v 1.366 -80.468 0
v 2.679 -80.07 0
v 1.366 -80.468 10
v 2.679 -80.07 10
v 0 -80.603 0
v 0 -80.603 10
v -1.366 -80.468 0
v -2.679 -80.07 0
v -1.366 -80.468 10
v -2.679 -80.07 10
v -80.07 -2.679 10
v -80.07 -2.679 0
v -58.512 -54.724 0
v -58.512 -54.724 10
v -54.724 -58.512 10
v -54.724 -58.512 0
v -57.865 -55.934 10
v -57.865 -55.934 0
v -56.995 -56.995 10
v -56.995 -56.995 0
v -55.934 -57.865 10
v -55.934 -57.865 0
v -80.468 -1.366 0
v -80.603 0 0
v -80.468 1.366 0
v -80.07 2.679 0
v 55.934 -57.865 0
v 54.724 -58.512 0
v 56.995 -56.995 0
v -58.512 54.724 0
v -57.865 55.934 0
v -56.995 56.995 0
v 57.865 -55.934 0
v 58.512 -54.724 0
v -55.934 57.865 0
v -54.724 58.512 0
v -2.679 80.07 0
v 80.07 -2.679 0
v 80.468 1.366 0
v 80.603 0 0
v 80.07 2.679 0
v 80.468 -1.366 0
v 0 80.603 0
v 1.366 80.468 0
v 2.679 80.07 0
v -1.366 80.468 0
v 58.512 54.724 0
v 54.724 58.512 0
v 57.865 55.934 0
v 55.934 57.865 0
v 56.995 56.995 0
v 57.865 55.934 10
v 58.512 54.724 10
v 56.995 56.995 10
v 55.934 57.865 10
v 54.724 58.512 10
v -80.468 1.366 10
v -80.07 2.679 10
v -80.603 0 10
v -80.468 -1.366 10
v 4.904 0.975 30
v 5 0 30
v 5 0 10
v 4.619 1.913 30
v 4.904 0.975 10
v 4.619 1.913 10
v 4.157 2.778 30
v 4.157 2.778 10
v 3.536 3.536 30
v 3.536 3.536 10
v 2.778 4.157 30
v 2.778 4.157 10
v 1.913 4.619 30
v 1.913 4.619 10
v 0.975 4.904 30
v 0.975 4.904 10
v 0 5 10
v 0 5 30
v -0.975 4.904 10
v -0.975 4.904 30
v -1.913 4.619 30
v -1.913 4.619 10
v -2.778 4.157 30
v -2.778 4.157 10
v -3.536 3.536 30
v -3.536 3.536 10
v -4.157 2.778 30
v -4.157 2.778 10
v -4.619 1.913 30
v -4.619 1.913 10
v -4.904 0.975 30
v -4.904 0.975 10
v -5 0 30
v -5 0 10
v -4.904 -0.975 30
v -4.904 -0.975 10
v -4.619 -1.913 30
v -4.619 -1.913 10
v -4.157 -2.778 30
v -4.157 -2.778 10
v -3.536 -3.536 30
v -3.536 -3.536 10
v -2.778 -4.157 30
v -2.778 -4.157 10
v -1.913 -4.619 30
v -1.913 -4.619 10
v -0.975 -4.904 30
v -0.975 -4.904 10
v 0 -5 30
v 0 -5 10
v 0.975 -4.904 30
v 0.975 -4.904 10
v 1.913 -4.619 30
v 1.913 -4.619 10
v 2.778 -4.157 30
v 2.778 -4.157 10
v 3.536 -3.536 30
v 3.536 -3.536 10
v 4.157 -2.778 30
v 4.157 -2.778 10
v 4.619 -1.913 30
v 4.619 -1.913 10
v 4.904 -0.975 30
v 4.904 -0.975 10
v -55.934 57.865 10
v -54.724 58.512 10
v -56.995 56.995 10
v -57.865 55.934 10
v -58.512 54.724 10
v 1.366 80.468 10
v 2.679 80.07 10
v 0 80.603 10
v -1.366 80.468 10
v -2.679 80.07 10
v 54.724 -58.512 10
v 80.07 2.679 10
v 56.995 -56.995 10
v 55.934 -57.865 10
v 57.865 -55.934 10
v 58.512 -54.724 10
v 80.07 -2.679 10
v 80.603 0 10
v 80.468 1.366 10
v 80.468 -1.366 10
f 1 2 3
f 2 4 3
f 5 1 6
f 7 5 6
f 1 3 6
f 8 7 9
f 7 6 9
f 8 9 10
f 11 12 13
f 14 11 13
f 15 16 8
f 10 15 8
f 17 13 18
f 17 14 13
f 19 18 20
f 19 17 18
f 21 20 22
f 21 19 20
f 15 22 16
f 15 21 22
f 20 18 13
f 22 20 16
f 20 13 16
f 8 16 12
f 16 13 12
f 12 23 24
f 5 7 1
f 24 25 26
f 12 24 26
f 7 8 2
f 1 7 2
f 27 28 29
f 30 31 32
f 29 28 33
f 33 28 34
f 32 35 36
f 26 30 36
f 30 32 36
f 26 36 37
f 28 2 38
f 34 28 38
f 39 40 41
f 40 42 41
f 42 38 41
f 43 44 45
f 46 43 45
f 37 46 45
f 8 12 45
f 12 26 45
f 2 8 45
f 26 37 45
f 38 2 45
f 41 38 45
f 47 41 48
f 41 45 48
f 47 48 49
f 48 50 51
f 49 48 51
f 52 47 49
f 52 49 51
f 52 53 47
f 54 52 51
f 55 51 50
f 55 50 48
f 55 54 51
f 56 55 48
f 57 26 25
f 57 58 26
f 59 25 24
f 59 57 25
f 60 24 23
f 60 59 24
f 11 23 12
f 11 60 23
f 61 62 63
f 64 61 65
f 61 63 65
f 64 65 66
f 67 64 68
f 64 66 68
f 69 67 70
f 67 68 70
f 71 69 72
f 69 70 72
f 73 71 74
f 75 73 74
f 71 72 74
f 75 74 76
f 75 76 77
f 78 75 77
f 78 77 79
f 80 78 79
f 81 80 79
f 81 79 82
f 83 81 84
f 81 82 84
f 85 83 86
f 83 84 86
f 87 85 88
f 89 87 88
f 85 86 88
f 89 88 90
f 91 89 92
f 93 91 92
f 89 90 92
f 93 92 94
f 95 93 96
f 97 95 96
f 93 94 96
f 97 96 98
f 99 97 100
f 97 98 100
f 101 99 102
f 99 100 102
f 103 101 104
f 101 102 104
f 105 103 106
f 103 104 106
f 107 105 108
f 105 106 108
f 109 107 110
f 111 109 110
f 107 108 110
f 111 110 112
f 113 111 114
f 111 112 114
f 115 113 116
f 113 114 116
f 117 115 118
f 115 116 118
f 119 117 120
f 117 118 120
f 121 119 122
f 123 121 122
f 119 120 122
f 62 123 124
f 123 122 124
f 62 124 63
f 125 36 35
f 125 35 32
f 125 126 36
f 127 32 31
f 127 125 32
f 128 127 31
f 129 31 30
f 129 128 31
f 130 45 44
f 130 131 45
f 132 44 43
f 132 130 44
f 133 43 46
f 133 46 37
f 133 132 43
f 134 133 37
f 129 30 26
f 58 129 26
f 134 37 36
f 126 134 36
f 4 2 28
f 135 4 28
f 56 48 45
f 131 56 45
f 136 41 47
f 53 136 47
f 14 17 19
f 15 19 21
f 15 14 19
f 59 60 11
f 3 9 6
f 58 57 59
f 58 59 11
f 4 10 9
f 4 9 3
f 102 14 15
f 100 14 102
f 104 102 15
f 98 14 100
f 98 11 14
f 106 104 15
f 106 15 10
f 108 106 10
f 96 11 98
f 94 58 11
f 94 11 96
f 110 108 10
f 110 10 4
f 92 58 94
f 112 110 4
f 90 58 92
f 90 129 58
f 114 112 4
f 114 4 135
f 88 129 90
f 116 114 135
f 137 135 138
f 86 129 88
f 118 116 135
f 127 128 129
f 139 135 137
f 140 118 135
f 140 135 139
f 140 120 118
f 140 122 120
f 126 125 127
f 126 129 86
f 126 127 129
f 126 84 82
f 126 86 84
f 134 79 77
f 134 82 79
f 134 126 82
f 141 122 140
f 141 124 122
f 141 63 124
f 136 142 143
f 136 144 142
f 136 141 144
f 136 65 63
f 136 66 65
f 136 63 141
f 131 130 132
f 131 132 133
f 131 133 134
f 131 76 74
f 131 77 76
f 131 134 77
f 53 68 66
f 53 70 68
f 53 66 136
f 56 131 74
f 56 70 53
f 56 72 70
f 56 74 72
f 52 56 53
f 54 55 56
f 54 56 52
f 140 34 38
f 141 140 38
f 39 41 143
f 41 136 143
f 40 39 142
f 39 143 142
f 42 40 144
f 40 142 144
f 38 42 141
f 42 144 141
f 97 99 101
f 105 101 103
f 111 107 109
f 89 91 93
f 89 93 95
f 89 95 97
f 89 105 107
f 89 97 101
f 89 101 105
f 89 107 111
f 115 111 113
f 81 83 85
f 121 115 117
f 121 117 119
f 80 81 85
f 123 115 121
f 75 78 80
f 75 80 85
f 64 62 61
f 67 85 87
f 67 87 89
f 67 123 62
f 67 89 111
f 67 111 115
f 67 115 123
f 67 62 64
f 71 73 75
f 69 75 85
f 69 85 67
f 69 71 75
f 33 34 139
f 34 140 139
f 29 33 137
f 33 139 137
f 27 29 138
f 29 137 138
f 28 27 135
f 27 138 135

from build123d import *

# Parameters (mm, degrees)
F1_DEPTH = 10
F2_R     = 5
F3_DEPTH = 20
F4_R     = 7


with BuildPart() as f1:
    # F0 (on Top) → F1 (new body)
    with BuildSketch(Plane.XY):
        Polygon((81.179415, 0), (57.402515, 57.402515), (0, 81.179415), (-57.402515, 57.402515), (-81.179415, 0), (-57.402515, -57.402515), (0, -81.179415), (57.402515, -57.402515), align=None)
    extrude(amount=F1_DEPTH)

    # F2 (on face) → F3 (join)
    with BuildSketch(Plane.XY.offset(10)):
        Circle(F2_R)
    extrude(amount=F3_DEPTH)

    # F4
    f4_edges = [f1.edges().sort_by_distance(p)[0] for p in [
        (-57.402515, 57.402515, 5),
        (-81.179415, 0, 5),
        (0, 81.179415, 5),
        (-57.402515, -57.402515, 5),
        (0, -81.179415, 5),
        (57.402515, -57.402515, 5),
        (81.179415, 0, 5),
        (57.402515, 57.402515, 5),
    ]]
    fillet(f4_edges, radius=F4_R)


solid = f1.part
